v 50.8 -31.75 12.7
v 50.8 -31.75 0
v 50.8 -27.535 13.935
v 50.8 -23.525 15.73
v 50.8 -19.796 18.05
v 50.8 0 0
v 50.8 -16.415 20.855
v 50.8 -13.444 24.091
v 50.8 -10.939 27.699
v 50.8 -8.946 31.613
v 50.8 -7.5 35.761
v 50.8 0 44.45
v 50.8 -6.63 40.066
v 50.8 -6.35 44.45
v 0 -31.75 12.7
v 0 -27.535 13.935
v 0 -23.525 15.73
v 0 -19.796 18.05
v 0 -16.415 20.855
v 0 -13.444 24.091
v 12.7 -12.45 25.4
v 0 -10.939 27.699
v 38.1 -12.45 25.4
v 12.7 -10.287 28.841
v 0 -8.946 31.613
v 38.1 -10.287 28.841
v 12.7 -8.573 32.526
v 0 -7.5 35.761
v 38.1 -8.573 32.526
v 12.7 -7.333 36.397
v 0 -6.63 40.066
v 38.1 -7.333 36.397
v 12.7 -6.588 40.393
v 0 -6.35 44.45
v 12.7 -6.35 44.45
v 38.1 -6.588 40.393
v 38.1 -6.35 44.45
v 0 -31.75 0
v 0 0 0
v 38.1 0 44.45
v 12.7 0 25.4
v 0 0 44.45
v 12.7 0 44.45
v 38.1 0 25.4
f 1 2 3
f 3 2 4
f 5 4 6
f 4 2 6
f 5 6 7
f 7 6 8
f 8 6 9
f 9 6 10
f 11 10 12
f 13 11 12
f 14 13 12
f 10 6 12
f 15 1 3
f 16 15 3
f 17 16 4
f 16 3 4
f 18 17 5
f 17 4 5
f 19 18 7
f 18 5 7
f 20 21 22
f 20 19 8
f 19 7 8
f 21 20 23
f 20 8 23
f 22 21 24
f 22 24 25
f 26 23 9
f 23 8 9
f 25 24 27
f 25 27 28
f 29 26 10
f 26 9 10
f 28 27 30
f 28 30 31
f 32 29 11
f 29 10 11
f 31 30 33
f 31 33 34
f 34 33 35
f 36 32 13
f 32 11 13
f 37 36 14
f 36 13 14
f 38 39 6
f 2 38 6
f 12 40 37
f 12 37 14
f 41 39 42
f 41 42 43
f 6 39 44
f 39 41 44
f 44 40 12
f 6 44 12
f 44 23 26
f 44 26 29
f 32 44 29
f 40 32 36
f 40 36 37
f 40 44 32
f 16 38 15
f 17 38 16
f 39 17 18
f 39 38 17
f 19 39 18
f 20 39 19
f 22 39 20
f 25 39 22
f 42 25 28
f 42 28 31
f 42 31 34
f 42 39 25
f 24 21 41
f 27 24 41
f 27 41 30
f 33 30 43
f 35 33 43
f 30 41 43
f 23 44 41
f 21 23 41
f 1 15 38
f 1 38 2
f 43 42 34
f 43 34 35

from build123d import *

# Parameters (mm, degrees)
F0_W     = 50.8
F0_H     = 44.45
F1_DEPTH = 31.75
F3_DEPTH = 76.2
F4_W     = 25.4
F4_H     = 19.05
F5_DEPTH = 25.4


with BuildPart() as f1:
    # F0 (on Front) → F1 (new body)
    with BuildSketch(Plane.XZ):
        with Locations((25.4, 22.225)):
            Rectangle(F0_W, F0_H)
    extrude(amount=F1_DEPTH)

    # F2 (on face) → F3 (cut)
    with BuildSketch(Plane.YZ.offset(50.8)):
        with BuildLine():
            Line((-31.75, 44.45), (-31.75, 12.7))
            ThreePointArc((-31.75, 12.7), (-13.444399, 24.090519), (-6.35, 44.45))
            Line((-6.35, 44.45), (-31.75, 44.45))
        make_face()
    extrude(amount=-F3_DEPTH, mode=Mode.SUBTRACT)

    # F4 (on face) → F5 (cut)
    with BuildSketch(Plane(origin=(0, 0, 0), x_dir=(-1, 0, 0), z_dir=(0, 1, 0))):
        with Locations((-25.4, 34.925)):
            Rectangle(F4_W, F4_H)
    extrude(amount=-F5_DEPTH, mode=Mode.SUBTRACT)


solid = f1.part
